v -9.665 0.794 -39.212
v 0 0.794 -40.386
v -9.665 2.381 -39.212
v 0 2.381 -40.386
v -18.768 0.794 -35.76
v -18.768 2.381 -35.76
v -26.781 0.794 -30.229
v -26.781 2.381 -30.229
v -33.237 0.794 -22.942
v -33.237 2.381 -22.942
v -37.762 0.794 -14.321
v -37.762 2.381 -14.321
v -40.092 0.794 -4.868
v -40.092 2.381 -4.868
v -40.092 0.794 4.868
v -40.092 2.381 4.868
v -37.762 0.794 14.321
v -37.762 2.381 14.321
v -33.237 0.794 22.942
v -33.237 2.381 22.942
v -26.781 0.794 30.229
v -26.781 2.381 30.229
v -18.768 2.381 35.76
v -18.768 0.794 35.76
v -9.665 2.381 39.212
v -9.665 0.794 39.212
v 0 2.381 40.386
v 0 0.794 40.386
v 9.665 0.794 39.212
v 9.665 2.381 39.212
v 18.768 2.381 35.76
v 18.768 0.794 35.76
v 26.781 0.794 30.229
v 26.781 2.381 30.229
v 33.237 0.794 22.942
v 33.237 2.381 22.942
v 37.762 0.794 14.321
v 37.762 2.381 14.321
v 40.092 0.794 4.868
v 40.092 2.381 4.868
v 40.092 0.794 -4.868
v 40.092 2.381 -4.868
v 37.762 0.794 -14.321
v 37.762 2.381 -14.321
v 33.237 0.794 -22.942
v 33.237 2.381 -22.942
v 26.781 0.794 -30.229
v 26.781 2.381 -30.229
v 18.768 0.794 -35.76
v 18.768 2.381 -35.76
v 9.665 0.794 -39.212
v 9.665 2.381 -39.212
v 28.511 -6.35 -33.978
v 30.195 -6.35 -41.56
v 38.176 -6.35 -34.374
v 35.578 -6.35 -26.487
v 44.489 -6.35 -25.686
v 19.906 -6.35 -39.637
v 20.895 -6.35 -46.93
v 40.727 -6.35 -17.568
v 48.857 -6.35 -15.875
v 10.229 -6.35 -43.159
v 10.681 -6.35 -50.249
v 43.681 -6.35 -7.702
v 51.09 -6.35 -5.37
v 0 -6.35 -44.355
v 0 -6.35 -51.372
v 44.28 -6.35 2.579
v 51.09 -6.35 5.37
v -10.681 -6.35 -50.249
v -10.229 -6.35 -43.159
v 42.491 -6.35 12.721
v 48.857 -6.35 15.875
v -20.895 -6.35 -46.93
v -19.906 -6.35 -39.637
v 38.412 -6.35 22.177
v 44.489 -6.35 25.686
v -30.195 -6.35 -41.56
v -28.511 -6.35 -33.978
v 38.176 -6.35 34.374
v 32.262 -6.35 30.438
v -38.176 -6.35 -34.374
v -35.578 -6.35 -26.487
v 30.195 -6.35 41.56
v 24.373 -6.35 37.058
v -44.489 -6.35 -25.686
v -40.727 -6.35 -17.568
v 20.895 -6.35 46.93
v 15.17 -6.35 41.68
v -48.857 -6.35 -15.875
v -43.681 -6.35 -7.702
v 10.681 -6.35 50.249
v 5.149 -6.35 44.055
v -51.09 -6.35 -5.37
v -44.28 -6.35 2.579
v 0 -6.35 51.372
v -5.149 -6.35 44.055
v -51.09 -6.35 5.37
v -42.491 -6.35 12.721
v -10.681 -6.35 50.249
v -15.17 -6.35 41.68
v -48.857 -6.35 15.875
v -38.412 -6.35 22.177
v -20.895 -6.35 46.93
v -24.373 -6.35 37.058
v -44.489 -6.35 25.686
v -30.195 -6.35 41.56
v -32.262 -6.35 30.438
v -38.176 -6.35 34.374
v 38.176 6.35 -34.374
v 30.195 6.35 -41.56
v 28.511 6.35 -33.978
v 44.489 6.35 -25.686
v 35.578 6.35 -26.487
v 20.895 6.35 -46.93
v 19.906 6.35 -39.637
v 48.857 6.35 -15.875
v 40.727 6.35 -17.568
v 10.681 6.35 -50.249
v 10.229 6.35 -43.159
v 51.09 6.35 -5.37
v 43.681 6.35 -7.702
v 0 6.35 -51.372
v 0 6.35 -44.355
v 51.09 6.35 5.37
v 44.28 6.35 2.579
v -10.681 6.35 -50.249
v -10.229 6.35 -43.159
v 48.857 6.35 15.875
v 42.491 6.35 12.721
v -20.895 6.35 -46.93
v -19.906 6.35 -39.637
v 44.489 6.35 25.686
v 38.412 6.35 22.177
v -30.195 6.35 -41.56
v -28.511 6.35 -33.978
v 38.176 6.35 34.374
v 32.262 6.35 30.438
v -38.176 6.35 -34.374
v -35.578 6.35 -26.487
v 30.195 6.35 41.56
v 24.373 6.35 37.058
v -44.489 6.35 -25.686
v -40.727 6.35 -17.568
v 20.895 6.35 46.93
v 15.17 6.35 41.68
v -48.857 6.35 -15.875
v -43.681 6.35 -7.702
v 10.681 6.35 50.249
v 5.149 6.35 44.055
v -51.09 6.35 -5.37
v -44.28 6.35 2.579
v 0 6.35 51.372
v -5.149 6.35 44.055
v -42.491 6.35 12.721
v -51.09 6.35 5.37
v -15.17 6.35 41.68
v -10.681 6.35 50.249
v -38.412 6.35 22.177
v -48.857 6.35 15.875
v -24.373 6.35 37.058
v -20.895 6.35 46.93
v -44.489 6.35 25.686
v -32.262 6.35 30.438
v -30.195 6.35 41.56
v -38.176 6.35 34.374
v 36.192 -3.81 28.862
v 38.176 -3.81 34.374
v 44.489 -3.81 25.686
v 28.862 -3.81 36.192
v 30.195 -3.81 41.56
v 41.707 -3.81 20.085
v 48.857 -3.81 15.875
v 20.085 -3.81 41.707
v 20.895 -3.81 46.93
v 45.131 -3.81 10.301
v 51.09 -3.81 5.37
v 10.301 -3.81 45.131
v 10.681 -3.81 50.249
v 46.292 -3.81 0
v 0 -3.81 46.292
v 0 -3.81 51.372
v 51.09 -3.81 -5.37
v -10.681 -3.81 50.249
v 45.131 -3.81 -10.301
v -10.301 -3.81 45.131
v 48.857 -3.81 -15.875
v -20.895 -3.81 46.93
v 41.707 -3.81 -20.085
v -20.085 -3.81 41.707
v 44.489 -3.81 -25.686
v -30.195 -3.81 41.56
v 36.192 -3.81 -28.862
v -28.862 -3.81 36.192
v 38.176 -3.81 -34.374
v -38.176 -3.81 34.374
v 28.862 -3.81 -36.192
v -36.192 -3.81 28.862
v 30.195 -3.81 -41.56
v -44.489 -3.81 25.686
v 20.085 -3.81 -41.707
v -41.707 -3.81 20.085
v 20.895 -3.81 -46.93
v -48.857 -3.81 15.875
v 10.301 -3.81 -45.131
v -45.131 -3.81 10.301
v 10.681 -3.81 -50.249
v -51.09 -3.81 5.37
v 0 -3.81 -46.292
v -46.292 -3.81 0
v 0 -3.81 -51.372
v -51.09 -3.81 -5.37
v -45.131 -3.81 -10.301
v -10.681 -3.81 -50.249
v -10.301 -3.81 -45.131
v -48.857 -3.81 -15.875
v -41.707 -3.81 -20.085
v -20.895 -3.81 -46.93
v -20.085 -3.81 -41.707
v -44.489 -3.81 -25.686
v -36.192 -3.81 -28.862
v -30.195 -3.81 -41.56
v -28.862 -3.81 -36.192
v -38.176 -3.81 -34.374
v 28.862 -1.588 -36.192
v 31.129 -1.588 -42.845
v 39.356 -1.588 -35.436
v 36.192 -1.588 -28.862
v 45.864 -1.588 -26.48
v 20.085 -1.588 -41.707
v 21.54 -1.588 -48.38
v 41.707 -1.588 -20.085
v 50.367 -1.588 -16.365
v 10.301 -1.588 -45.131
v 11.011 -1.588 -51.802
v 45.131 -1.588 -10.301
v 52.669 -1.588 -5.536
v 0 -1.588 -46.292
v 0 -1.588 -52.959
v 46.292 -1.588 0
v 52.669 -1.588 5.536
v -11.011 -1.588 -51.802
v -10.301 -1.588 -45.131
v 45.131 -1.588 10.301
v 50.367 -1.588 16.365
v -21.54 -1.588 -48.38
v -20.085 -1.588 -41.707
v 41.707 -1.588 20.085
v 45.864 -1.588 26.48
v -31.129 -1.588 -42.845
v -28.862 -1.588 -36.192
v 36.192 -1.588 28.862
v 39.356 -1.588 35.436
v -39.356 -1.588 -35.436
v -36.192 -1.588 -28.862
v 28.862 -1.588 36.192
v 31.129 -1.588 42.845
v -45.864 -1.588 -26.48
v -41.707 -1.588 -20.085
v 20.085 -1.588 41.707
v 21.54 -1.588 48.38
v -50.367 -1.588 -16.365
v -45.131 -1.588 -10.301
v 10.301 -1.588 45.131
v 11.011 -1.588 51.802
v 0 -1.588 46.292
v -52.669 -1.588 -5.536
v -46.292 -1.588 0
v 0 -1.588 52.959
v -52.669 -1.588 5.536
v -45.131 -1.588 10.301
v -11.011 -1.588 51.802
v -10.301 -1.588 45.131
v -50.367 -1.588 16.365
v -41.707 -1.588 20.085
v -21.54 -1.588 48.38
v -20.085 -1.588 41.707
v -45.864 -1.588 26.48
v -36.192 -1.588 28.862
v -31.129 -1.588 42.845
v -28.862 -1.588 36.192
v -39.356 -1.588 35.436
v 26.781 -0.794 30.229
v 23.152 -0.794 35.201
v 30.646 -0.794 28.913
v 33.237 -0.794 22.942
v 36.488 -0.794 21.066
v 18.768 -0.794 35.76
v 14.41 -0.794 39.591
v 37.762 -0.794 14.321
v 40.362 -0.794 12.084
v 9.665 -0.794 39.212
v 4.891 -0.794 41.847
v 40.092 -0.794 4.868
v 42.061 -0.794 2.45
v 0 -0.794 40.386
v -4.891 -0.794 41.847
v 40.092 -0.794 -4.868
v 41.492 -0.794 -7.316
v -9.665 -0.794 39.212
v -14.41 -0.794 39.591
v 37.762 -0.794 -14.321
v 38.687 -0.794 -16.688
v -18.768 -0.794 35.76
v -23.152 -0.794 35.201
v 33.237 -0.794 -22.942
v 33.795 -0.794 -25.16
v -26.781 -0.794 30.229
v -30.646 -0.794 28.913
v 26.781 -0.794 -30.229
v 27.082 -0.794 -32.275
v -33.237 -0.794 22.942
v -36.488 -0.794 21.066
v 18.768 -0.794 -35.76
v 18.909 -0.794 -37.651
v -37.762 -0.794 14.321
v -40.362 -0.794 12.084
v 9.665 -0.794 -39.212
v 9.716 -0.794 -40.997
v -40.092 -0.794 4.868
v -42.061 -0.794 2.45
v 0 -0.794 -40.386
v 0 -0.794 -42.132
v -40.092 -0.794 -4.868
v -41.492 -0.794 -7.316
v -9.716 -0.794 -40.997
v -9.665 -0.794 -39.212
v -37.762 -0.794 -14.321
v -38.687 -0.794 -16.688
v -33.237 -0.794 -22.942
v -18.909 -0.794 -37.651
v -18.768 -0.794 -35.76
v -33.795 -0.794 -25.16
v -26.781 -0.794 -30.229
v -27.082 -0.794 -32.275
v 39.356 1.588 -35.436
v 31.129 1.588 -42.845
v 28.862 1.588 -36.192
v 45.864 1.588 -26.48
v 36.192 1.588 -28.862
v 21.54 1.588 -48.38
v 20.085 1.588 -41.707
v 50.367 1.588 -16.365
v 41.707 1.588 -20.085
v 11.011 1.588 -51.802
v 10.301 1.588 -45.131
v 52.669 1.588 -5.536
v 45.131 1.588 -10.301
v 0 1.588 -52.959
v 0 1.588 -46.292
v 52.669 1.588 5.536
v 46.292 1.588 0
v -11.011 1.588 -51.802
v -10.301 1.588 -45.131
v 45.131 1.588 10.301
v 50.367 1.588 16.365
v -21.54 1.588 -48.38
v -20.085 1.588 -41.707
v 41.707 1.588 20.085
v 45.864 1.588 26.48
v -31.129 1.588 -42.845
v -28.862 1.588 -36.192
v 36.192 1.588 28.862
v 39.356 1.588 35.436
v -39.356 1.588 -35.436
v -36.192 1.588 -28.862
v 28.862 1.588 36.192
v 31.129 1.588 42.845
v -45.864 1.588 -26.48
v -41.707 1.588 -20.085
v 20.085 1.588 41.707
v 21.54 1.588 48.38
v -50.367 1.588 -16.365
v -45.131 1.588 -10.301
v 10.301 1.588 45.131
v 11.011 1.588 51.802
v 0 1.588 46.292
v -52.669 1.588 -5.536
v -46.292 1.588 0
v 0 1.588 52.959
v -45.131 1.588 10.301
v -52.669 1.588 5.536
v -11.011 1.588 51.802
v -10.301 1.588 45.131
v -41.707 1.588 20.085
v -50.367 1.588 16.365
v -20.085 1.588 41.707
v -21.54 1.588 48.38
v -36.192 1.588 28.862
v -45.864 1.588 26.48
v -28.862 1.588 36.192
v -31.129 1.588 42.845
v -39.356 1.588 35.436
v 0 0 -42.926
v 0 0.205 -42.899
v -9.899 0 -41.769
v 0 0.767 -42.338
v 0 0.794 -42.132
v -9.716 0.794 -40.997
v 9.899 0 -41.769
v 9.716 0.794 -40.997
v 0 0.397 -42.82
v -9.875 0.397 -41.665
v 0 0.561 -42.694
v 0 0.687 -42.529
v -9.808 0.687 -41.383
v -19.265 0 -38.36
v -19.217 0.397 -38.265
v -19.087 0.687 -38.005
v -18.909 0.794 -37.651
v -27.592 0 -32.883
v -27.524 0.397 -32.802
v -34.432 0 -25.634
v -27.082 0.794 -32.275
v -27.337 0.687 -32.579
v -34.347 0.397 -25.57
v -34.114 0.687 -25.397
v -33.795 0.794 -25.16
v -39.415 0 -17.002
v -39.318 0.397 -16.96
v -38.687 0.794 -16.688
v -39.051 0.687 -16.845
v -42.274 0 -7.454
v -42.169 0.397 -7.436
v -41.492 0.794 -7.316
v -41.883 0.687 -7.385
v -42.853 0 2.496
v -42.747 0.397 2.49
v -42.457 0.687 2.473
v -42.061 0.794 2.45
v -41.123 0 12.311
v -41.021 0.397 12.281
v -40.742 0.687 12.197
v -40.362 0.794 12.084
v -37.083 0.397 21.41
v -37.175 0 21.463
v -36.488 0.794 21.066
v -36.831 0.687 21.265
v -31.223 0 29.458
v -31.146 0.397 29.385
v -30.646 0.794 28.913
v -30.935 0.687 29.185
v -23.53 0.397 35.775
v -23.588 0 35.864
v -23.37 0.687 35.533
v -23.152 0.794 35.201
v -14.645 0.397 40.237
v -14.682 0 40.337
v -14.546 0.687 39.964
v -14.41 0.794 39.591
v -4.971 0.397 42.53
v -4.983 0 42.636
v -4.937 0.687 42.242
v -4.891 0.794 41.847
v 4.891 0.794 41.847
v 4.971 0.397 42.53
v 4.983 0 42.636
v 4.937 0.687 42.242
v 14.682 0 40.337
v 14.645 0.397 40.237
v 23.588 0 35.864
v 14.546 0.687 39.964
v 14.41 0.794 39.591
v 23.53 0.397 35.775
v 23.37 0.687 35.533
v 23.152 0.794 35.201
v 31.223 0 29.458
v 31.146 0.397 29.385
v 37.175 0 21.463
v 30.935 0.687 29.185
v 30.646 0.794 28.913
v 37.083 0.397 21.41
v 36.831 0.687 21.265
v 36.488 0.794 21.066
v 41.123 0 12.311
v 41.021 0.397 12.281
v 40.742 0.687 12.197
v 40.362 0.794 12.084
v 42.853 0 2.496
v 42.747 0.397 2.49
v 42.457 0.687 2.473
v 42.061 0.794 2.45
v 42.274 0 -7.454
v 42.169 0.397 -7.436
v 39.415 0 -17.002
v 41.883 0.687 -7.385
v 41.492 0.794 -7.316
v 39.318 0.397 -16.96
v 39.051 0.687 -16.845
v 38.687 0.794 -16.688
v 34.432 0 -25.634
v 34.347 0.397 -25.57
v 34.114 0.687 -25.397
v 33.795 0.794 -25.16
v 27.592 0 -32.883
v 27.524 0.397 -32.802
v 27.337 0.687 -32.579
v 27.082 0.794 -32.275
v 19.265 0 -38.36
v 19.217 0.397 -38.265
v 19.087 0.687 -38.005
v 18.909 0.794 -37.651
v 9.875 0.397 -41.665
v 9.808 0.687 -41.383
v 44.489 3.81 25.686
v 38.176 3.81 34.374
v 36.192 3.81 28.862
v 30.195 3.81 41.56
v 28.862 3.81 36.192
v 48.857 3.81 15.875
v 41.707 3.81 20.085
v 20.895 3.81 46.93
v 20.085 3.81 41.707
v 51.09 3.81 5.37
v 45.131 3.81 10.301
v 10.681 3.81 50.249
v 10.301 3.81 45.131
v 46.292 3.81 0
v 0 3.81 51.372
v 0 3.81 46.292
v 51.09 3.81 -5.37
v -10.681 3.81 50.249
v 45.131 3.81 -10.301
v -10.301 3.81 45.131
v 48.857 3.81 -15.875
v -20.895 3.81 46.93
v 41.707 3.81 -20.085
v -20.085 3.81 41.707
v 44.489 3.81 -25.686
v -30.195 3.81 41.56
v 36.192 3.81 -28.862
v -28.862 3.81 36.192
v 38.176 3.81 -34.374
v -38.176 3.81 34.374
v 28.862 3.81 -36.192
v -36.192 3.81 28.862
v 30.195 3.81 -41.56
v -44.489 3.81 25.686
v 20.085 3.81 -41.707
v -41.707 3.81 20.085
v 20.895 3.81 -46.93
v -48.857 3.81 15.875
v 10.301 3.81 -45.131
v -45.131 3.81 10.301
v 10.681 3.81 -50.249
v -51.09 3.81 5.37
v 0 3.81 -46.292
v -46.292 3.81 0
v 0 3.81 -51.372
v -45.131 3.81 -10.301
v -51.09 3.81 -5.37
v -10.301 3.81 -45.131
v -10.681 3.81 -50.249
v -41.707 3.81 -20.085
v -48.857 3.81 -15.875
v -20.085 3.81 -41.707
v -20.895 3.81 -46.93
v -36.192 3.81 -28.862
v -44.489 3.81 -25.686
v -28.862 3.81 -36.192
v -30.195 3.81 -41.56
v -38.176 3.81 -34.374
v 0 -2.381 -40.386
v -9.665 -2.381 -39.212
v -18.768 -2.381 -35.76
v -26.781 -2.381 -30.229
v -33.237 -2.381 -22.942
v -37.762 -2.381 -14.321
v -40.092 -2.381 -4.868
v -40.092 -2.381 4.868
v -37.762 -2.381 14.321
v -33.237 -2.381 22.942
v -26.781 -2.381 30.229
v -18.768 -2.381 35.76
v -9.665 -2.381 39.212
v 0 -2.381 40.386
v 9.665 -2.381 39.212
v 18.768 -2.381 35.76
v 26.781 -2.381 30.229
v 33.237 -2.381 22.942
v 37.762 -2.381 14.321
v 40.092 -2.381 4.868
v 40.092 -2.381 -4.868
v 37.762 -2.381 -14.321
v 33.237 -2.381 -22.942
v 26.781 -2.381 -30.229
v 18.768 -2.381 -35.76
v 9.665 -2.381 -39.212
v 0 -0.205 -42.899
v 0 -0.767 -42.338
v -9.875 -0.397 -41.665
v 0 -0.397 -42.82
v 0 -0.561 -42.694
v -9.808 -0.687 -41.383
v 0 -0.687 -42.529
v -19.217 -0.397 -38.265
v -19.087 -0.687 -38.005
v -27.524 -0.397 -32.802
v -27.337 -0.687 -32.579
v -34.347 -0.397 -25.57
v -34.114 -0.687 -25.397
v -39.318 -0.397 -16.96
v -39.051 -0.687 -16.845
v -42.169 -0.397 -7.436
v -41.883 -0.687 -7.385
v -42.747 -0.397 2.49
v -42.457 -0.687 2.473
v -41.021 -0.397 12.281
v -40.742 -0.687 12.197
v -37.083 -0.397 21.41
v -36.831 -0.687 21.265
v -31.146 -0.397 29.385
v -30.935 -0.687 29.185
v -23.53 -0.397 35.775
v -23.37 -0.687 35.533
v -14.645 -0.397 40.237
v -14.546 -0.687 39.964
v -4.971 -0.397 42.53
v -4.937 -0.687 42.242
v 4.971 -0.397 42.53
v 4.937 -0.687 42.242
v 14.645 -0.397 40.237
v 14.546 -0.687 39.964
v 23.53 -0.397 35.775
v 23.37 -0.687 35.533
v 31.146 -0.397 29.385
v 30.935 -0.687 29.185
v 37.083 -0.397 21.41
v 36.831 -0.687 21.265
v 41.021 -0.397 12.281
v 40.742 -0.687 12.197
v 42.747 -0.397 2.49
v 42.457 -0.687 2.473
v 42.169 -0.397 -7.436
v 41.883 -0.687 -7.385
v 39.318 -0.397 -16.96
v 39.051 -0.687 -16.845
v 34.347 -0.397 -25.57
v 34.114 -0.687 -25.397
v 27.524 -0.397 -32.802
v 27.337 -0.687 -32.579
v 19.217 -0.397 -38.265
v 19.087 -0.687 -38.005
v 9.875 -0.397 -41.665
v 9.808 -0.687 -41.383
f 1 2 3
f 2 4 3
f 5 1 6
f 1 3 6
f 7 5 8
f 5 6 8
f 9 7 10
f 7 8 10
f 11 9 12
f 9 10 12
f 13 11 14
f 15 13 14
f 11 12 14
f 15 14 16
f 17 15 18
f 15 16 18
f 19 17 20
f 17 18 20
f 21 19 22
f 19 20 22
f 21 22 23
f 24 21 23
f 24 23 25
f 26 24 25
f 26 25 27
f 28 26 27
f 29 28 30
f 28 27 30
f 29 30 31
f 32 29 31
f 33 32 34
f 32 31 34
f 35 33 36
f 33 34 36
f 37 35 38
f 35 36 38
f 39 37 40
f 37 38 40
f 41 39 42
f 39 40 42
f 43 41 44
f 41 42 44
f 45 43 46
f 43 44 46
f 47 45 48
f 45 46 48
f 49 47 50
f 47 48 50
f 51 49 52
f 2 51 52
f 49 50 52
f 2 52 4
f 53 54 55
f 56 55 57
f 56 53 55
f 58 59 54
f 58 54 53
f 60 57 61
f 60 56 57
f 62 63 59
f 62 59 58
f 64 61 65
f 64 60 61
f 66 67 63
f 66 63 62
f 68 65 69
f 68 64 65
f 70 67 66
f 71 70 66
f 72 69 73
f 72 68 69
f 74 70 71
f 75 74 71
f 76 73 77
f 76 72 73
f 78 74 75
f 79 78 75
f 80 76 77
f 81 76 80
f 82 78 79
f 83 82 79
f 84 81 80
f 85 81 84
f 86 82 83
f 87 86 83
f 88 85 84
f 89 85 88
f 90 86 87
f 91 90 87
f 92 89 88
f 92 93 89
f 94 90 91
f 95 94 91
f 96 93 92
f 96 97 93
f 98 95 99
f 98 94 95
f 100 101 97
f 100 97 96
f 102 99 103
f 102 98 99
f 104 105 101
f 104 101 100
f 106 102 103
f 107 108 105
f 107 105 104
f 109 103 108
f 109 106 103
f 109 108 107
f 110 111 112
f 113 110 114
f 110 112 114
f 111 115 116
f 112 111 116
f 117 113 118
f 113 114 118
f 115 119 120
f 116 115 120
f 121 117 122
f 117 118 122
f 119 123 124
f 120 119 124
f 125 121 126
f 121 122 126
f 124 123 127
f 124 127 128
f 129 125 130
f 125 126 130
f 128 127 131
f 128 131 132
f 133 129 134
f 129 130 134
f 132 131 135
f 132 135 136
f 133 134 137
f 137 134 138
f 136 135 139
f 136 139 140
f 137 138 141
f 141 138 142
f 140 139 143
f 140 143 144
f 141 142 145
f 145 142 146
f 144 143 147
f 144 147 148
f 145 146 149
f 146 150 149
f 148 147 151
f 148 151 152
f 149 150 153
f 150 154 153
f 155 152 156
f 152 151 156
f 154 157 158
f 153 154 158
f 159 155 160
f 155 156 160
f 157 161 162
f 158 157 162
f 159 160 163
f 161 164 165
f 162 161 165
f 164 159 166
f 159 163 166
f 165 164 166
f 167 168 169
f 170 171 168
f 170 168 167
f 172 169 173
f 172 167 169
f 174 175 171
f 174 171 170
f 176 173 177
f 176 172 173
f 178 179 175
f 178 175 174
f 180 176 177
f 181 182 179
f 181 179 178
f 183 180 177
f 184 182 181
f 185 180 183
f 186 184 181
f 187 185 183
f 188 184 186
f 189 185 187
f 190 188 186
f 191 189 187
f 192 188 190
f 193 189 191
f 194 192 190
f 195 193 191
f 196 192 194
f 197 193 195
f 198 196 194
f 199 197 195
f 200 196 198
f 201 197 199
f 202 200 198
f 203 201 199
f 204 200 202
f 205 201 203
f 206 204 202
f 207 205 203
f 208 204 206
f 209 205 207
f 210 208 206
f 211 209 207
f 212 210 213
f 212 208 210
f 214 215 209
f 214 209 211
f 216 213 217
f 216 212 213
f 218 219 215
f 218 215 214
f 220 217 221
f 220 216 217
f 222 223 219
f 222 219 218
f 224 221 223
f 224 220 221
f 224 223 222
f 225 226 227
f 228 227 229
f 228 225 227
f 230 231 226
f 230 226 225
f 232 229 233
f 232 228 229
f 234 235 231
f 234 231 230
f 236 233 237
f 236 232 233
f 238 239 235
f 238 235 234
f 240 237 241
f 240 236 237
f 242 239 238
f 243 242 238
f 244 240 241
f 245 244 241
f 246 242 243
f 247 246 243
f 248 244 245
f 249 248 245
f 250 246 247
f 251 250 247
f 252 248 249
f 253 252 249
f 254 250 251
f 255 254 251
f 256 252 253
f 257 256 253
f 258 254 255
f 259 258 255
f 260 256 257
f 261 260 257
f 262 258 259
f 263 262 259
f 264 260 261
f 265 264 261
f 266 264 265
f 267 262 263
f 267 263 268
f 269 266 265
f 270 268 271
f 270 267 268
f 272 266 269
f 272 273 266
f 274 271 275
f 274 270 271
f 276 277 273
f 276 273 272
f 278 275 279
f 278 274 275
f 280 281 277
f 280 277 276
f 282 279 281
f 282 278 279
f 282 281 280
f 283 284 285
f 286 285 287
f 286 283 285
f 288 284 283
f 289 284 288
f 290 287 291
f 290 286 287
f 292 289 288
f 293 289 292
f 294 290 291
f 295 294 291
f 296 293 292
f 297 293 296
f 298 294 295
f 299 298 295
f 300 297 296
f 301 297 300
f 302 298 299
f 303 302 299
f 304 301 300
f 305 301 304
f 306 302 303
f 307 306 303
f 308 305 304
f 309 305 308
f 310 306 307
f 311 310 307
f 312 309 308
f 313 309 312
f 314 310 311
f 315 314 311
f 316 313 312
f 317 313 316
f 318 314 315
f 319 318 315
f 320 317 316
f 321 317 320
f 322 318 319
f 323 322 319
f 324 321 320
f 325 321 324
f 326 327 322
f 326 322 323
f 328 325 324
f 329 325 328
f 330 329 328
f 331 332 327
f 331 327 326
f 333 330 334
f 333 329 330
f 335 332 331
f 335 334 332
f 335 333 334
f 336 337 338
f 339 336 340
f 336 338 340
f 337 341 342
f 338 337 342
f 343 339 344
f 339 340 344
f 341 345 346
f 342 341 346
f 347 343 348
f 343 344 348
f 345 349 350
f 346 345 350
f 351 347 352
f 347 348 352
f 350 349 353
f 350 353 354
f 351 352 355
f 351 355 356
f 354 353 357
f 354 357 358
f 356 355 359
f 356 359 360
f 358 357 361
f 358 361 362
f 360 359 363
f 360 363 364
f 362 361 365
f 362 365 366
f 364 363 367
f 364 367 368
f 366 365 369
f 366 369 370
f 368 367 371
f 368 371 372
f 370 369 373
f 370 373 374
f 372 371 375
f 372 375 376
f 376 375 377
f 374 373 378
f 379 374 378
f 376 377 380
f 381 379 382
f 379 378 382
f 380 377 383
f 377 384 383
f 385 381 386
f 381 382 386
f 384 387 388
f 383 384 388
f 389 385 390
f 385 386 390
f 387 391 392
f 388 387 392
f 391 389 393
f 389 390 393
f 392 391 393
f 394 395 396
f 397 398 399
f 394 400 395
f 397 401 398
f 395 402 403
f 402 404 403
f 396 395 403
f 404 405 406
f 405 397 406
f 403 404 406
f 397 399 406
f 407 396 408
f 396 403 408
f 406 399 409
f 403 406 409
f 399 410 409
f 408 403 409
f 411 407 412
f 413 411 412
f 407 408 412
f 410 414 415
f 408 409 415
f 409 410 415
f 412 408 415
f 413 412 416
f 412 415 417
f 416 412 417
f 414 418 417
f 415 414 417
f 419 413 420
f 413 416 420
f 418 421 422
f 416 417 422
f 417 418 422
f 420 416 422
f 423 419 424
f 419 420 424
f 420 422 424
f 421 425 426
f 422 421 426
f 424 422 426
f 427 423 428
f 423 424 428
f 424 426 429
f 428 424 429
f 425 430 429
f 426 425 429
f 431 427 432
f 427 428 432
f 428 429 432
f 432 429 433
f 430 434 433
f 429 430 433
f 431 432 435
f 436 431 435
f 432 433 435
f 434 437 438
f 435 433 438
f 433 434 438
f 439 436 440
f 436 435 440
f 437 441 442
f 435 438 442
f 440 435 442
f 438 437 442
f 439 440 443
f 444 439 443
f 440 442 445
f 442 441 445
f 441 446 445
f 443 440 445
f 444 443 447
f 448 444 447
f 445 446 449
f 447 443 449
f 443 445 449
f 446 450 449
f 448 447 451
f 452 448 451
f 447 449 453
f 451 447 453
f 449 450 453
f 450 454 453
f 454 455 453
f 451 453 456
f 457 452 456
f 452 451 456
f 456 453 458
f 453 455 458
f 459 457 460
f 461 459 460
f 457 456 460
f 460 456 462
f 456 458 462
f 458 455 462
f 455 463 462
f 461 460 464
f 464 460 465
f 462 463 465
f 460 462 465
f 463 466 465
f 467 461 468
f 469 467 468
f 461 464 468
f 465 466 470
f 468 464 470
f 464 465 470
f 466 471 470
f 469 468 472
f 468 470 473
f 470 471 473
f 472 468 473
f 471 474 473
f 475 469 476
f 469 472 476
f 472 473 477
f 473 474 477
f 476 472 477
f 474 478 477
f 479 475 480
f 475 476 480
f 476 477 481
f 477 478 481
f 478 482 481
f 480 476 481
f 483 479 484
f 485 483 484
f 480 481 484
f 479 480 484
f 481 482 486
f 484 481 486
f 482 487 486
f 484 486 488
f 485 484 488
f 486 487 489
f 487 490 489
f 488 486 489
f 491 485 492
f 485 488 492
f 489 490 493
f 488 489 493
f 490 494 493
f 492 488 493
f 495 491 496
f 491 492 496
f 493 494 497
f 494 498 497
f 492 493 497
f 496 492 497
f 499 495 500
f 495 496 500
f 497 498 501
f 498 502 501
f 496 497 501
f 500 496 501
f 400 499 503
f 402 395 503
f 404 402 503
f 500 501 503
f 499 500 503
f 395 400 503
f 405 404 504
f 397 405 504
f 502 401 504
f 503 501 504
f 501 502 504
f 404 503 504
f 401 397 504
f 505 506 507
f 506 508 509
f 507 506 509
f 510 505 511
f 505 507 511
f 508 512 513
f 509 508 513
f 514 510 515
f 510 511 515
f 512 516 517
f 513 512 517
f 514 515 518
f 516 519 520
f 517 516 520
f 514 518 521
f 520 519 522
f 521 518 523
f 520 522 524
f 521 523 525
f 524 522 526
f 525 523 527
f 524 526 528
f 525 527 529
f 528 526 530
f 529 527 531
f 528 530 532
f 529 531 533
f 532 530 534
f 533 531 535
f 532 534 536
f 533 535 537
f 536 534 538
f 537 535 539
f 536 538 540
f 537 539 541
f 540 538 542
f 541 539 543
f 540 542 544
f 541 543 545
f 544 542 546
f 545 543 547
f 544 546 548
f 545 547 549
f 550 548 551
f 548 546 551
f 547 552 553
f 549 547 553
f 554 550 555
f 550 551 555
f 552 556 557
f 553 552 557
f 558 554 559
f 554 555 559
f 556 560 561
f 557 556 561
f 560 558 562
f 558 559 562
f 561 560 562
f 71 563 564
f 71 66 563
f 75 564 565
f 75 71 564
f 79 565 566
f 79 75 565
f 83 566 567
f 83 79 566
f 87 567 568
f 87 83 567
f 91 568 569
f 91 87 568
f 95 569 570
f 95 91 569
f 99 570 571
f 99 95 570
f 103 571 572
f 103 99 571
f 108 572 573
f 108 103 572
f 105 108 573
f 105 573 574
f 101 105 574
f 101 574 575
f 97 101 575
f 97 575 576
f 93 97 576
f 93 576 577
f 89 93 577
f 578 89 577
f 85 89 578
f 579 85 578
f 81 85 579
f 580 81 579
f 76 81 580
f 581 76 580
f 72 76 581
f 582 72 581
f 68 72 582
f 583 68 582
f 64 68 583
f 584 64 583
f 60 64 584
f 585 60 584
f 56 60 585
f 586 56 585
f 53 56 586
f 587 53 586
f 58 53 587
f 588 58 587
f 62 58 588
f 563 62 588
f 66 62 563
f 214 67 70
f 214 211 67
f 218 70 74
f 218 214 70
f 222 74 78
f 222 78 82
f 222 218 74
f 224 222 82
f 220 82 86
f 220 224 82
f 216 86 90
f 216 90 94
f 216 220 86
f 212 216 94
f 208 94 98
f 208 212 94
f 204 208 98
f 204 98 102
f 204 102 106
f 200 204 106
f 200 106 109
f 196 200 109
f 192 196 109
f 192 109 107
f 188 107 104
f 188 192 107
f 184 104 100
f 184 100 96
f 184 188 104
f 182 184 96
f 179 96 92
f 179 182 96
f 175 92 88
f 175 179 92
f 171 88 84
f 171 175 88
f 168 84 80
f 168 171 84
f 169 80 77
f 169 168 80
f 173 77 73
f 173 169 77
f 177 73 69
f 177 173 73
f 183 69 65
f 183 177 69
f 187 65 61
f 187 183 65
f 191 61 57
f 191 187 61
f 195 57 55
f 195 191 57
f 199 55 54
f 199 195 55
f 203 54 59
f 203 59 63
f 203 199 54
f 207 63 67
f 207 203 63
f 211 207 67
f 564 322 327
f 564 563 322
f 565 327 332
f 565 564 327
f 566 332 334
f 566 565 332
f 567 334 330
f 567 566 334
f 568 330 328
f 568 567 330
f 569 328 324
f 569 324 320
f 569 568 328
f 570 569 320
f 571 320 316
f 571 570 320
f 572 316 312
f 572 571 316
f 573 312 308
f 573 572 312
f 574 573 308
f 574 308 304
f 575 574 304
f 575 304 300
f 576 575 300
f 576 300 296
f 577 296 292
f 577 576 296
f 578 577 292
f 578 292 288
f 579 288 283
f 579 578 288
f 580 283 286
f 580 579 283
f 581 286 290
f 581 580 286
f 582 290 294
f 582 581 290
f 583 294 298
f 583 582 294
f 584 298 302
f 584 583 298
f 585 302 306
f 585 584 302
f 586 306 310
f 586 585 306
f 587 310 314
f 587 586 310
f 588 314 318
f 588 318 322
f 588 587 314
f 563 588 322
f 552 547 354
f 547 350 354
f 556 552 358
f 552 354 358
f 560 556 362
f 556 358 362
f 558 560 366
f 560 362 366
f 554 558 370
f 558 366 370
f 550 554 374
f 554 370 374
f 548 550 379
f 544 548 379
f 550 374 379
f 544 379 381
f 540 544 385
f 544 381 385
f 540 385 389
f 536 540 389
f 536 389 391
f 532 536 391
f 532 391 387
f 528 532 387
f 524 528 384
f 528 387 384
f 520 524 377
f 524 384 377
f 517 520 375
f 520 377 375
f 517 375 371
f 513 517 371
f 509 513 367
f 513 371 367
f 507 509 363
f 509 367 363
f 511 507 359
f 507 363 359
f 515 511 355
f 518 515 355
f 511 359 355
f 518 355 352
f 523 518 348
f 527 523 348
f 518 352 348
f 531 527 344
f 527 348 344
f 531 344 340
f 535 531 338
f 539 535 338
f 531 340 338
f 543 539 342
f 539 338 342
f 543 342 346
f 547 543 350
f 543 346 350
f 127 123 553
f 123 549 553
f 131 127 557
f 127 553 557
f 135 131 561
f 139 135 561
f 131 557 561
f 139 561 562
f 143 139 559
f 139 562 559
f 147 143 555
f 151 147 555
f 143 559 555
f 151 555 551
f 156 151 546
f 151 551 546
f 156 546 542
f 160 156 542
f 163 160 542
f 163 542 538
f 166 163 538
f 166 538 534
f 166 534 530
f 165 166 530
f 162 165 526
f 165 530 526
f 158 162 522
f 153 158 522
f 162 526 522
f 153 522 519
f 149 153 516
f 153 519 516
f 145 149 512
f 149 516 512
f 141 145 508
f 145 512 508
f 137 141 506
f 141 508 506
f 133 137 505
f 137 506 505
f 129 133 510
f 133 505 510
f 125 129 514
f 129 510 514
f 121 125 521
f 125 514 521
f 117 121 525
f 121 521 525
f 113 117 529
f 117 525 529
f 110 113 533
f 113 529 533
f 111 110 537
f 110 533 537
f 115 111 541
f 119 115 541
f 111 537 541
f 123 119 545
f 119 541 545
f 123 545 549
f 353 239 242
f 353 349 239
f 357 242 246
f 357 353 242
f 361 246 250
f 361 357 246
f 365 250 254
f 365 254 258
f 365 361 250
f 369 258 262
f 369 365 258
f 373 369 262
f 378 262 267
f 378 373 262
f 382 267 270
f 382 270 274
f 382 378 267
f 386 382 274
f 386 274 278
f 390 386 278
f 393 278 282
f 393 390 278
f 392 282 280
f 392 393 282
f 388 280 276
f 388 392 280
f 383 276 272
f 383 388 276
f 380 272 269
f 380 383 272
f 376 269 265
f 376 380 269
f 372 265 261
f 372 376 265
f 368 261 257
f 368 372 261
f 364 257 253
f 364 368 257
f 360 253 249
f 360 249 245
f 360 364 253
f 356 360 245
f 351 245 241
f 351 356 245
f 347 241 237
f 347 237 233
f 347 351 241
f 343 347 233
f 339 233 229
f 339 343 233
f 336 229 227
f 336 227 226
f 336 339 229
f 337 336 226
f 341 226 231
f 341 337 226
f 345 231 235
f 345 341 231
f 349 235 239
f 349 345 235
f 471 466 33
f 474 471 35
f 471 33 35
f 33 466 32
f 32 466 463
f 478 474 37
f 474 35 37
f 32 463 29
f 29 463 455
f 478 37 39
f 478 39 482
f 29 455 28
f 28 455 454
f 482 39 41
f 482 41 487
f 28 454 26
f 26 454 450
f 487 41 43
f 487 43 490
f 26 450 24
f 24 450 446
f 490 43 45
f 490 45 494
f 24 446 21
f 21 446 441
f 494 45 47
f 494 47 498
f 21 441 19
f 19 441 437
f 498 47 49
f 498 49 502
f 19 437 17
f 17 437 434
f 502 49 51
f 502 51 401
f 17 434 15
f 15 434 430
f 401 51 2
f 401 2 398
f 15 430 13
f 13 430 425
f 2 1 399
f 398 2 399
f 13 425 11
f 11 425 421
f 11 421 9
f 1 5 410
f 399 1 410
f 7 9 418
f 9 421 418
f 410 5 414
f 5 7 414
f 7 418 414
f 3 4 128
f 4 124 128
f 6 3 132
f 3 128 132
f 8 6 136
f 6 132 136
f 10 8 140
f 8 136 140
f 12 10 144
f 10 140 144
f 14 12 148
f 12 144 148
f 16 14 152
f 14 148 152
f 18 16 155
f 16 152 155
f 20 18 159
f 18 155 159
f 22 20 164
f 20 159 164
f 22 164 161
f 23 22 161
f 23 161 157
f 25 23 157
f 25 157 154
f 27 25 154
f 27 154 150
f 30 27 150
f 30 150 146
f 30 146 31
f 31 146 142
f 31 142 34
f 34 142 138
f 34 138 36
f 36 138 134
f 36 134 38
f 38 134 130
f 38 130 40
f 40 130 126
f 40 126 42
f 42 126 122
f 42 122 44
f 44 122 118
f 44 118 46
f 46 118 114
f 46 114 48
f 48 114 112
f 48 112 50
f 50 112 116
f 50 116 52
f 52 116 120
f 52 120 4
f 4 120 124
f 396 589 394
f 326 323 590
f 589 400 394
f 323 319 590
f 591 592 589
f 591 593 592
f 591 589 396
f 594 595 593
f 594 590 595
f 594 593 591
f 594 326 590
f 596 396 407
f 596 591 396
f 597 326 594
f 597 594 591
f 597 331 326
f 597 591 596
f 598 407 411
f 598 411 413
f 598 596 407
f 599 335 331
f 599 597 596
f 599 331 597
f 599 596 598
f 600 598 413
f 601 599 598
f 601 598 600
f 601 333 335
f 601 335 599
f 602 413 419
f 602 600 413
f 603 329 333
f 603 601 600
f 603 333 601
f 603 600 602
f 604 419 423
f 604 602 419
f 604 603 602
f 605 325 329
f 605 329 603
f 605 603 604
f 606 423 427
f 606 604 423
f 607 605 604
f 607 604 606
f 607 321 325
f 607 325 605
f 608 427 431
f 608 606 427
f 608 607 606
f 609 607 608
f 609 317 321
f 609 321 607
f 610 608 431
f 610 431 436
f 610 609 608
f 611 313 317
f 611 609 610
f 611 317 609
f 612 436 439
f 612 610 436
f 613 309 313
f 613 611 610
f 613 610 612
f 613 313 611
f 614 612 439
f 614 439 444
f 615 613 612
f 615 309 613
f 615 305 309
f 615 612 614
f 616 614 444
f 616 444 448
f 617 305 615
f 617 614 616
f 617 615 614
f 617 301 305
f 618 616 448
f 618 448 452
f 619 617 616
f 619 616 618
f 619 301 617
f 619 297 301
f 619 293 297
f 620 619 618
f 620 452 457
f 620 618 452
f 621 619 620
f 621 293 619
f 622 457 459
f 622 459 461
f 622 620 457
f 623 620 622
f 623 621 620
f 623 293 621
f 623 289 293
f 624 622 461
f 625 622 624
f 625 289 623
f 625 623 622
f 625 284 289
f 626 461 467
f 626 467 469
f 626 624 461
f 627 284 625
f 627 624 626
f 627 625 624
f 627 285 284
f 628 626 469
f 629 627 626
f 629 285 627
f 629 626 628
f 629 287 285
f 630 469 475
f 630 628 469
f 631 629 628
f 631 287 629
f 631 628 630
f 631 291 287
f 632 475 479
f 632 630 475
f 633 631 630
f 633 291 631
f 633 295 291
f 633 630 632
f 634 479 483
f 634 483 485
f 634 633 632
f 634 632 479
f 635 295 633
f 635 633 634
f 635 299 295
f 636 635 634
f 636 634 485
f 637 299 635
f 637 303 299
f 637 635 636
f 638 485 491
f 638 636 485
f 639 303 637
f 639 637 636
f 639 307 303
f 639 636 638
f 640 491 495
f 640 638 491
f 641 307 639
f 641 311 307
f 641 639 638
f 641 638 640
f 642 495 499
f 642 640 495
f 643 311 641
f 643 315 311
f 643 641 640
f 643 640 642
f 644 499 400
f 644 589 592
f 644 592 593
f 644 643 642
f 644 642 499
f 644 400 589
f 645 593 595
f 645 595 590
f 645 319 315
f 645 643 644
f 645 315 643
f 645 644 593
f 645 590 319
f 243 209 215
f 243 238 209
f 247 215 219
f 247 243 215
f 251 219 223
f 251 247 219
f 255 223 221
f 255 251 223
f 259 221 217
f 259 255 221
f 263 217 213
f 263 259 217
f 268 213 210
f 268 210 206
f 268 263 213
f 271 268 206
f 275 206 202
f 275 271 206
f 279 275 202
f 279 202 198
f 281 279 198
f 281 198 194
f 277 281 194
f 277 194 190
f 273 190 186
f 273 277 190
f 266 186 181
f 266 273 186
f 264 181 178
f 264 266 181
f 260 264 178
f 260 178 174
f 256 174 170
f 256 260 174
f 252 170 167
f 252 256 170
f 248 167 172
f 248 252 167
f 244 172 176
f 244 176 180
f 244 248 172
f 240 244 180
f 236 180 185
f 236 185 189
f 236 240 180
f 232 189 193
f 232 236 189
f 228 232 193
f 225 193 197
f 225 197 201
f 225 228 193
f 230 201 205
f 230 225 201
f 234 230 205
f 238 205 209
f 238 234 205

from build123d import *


with BuildPart() as part:
    # Sketch1 → Revolve1 (revolve)
    with BuildSketch(Plane.XY, mode=Mode.PRIVATE) as revolve1_sk:
        with BuildLine():
            Line((40.386, 0.79375), (40.386, 2.38125))
            Line((40.386, 2.38125), (44.35475, 6.35))
            Line((44.35475, 6.35), (51.3715, 6.35))
            Line((51.3715, 6.35), (51.3715, 3.81))
            Line((51.3715, 3.81), (46.2915, 3.81))
            Line((46.2915, 3.81), (46.2915, 1.5875))
            Line((46.2915, 1.5875), (52.959, 1.5875))
            Line((52.959, 1.5875), (52.959, 0))
            Line((52.959, 0), (42.926, 0))
            ThreePointArc((42.926, 0), (42.693516008, 0.561266008), (42.13225, 0.79375))
            Line((42.13225, 0.79375), (40.386, 0.79375))
        make_face()
    revolve1 = revolve(revolve1_sk.sketch.rotate(Axis((0, 0, 0), (0, 1, 0)), 90), axis=Axis((0, 0, 0), (0, 1, 0)))

    # Mirror1: Revolve1 across plane
    add(revolve1.mirror(Plane.ZX))


solid = part.part
